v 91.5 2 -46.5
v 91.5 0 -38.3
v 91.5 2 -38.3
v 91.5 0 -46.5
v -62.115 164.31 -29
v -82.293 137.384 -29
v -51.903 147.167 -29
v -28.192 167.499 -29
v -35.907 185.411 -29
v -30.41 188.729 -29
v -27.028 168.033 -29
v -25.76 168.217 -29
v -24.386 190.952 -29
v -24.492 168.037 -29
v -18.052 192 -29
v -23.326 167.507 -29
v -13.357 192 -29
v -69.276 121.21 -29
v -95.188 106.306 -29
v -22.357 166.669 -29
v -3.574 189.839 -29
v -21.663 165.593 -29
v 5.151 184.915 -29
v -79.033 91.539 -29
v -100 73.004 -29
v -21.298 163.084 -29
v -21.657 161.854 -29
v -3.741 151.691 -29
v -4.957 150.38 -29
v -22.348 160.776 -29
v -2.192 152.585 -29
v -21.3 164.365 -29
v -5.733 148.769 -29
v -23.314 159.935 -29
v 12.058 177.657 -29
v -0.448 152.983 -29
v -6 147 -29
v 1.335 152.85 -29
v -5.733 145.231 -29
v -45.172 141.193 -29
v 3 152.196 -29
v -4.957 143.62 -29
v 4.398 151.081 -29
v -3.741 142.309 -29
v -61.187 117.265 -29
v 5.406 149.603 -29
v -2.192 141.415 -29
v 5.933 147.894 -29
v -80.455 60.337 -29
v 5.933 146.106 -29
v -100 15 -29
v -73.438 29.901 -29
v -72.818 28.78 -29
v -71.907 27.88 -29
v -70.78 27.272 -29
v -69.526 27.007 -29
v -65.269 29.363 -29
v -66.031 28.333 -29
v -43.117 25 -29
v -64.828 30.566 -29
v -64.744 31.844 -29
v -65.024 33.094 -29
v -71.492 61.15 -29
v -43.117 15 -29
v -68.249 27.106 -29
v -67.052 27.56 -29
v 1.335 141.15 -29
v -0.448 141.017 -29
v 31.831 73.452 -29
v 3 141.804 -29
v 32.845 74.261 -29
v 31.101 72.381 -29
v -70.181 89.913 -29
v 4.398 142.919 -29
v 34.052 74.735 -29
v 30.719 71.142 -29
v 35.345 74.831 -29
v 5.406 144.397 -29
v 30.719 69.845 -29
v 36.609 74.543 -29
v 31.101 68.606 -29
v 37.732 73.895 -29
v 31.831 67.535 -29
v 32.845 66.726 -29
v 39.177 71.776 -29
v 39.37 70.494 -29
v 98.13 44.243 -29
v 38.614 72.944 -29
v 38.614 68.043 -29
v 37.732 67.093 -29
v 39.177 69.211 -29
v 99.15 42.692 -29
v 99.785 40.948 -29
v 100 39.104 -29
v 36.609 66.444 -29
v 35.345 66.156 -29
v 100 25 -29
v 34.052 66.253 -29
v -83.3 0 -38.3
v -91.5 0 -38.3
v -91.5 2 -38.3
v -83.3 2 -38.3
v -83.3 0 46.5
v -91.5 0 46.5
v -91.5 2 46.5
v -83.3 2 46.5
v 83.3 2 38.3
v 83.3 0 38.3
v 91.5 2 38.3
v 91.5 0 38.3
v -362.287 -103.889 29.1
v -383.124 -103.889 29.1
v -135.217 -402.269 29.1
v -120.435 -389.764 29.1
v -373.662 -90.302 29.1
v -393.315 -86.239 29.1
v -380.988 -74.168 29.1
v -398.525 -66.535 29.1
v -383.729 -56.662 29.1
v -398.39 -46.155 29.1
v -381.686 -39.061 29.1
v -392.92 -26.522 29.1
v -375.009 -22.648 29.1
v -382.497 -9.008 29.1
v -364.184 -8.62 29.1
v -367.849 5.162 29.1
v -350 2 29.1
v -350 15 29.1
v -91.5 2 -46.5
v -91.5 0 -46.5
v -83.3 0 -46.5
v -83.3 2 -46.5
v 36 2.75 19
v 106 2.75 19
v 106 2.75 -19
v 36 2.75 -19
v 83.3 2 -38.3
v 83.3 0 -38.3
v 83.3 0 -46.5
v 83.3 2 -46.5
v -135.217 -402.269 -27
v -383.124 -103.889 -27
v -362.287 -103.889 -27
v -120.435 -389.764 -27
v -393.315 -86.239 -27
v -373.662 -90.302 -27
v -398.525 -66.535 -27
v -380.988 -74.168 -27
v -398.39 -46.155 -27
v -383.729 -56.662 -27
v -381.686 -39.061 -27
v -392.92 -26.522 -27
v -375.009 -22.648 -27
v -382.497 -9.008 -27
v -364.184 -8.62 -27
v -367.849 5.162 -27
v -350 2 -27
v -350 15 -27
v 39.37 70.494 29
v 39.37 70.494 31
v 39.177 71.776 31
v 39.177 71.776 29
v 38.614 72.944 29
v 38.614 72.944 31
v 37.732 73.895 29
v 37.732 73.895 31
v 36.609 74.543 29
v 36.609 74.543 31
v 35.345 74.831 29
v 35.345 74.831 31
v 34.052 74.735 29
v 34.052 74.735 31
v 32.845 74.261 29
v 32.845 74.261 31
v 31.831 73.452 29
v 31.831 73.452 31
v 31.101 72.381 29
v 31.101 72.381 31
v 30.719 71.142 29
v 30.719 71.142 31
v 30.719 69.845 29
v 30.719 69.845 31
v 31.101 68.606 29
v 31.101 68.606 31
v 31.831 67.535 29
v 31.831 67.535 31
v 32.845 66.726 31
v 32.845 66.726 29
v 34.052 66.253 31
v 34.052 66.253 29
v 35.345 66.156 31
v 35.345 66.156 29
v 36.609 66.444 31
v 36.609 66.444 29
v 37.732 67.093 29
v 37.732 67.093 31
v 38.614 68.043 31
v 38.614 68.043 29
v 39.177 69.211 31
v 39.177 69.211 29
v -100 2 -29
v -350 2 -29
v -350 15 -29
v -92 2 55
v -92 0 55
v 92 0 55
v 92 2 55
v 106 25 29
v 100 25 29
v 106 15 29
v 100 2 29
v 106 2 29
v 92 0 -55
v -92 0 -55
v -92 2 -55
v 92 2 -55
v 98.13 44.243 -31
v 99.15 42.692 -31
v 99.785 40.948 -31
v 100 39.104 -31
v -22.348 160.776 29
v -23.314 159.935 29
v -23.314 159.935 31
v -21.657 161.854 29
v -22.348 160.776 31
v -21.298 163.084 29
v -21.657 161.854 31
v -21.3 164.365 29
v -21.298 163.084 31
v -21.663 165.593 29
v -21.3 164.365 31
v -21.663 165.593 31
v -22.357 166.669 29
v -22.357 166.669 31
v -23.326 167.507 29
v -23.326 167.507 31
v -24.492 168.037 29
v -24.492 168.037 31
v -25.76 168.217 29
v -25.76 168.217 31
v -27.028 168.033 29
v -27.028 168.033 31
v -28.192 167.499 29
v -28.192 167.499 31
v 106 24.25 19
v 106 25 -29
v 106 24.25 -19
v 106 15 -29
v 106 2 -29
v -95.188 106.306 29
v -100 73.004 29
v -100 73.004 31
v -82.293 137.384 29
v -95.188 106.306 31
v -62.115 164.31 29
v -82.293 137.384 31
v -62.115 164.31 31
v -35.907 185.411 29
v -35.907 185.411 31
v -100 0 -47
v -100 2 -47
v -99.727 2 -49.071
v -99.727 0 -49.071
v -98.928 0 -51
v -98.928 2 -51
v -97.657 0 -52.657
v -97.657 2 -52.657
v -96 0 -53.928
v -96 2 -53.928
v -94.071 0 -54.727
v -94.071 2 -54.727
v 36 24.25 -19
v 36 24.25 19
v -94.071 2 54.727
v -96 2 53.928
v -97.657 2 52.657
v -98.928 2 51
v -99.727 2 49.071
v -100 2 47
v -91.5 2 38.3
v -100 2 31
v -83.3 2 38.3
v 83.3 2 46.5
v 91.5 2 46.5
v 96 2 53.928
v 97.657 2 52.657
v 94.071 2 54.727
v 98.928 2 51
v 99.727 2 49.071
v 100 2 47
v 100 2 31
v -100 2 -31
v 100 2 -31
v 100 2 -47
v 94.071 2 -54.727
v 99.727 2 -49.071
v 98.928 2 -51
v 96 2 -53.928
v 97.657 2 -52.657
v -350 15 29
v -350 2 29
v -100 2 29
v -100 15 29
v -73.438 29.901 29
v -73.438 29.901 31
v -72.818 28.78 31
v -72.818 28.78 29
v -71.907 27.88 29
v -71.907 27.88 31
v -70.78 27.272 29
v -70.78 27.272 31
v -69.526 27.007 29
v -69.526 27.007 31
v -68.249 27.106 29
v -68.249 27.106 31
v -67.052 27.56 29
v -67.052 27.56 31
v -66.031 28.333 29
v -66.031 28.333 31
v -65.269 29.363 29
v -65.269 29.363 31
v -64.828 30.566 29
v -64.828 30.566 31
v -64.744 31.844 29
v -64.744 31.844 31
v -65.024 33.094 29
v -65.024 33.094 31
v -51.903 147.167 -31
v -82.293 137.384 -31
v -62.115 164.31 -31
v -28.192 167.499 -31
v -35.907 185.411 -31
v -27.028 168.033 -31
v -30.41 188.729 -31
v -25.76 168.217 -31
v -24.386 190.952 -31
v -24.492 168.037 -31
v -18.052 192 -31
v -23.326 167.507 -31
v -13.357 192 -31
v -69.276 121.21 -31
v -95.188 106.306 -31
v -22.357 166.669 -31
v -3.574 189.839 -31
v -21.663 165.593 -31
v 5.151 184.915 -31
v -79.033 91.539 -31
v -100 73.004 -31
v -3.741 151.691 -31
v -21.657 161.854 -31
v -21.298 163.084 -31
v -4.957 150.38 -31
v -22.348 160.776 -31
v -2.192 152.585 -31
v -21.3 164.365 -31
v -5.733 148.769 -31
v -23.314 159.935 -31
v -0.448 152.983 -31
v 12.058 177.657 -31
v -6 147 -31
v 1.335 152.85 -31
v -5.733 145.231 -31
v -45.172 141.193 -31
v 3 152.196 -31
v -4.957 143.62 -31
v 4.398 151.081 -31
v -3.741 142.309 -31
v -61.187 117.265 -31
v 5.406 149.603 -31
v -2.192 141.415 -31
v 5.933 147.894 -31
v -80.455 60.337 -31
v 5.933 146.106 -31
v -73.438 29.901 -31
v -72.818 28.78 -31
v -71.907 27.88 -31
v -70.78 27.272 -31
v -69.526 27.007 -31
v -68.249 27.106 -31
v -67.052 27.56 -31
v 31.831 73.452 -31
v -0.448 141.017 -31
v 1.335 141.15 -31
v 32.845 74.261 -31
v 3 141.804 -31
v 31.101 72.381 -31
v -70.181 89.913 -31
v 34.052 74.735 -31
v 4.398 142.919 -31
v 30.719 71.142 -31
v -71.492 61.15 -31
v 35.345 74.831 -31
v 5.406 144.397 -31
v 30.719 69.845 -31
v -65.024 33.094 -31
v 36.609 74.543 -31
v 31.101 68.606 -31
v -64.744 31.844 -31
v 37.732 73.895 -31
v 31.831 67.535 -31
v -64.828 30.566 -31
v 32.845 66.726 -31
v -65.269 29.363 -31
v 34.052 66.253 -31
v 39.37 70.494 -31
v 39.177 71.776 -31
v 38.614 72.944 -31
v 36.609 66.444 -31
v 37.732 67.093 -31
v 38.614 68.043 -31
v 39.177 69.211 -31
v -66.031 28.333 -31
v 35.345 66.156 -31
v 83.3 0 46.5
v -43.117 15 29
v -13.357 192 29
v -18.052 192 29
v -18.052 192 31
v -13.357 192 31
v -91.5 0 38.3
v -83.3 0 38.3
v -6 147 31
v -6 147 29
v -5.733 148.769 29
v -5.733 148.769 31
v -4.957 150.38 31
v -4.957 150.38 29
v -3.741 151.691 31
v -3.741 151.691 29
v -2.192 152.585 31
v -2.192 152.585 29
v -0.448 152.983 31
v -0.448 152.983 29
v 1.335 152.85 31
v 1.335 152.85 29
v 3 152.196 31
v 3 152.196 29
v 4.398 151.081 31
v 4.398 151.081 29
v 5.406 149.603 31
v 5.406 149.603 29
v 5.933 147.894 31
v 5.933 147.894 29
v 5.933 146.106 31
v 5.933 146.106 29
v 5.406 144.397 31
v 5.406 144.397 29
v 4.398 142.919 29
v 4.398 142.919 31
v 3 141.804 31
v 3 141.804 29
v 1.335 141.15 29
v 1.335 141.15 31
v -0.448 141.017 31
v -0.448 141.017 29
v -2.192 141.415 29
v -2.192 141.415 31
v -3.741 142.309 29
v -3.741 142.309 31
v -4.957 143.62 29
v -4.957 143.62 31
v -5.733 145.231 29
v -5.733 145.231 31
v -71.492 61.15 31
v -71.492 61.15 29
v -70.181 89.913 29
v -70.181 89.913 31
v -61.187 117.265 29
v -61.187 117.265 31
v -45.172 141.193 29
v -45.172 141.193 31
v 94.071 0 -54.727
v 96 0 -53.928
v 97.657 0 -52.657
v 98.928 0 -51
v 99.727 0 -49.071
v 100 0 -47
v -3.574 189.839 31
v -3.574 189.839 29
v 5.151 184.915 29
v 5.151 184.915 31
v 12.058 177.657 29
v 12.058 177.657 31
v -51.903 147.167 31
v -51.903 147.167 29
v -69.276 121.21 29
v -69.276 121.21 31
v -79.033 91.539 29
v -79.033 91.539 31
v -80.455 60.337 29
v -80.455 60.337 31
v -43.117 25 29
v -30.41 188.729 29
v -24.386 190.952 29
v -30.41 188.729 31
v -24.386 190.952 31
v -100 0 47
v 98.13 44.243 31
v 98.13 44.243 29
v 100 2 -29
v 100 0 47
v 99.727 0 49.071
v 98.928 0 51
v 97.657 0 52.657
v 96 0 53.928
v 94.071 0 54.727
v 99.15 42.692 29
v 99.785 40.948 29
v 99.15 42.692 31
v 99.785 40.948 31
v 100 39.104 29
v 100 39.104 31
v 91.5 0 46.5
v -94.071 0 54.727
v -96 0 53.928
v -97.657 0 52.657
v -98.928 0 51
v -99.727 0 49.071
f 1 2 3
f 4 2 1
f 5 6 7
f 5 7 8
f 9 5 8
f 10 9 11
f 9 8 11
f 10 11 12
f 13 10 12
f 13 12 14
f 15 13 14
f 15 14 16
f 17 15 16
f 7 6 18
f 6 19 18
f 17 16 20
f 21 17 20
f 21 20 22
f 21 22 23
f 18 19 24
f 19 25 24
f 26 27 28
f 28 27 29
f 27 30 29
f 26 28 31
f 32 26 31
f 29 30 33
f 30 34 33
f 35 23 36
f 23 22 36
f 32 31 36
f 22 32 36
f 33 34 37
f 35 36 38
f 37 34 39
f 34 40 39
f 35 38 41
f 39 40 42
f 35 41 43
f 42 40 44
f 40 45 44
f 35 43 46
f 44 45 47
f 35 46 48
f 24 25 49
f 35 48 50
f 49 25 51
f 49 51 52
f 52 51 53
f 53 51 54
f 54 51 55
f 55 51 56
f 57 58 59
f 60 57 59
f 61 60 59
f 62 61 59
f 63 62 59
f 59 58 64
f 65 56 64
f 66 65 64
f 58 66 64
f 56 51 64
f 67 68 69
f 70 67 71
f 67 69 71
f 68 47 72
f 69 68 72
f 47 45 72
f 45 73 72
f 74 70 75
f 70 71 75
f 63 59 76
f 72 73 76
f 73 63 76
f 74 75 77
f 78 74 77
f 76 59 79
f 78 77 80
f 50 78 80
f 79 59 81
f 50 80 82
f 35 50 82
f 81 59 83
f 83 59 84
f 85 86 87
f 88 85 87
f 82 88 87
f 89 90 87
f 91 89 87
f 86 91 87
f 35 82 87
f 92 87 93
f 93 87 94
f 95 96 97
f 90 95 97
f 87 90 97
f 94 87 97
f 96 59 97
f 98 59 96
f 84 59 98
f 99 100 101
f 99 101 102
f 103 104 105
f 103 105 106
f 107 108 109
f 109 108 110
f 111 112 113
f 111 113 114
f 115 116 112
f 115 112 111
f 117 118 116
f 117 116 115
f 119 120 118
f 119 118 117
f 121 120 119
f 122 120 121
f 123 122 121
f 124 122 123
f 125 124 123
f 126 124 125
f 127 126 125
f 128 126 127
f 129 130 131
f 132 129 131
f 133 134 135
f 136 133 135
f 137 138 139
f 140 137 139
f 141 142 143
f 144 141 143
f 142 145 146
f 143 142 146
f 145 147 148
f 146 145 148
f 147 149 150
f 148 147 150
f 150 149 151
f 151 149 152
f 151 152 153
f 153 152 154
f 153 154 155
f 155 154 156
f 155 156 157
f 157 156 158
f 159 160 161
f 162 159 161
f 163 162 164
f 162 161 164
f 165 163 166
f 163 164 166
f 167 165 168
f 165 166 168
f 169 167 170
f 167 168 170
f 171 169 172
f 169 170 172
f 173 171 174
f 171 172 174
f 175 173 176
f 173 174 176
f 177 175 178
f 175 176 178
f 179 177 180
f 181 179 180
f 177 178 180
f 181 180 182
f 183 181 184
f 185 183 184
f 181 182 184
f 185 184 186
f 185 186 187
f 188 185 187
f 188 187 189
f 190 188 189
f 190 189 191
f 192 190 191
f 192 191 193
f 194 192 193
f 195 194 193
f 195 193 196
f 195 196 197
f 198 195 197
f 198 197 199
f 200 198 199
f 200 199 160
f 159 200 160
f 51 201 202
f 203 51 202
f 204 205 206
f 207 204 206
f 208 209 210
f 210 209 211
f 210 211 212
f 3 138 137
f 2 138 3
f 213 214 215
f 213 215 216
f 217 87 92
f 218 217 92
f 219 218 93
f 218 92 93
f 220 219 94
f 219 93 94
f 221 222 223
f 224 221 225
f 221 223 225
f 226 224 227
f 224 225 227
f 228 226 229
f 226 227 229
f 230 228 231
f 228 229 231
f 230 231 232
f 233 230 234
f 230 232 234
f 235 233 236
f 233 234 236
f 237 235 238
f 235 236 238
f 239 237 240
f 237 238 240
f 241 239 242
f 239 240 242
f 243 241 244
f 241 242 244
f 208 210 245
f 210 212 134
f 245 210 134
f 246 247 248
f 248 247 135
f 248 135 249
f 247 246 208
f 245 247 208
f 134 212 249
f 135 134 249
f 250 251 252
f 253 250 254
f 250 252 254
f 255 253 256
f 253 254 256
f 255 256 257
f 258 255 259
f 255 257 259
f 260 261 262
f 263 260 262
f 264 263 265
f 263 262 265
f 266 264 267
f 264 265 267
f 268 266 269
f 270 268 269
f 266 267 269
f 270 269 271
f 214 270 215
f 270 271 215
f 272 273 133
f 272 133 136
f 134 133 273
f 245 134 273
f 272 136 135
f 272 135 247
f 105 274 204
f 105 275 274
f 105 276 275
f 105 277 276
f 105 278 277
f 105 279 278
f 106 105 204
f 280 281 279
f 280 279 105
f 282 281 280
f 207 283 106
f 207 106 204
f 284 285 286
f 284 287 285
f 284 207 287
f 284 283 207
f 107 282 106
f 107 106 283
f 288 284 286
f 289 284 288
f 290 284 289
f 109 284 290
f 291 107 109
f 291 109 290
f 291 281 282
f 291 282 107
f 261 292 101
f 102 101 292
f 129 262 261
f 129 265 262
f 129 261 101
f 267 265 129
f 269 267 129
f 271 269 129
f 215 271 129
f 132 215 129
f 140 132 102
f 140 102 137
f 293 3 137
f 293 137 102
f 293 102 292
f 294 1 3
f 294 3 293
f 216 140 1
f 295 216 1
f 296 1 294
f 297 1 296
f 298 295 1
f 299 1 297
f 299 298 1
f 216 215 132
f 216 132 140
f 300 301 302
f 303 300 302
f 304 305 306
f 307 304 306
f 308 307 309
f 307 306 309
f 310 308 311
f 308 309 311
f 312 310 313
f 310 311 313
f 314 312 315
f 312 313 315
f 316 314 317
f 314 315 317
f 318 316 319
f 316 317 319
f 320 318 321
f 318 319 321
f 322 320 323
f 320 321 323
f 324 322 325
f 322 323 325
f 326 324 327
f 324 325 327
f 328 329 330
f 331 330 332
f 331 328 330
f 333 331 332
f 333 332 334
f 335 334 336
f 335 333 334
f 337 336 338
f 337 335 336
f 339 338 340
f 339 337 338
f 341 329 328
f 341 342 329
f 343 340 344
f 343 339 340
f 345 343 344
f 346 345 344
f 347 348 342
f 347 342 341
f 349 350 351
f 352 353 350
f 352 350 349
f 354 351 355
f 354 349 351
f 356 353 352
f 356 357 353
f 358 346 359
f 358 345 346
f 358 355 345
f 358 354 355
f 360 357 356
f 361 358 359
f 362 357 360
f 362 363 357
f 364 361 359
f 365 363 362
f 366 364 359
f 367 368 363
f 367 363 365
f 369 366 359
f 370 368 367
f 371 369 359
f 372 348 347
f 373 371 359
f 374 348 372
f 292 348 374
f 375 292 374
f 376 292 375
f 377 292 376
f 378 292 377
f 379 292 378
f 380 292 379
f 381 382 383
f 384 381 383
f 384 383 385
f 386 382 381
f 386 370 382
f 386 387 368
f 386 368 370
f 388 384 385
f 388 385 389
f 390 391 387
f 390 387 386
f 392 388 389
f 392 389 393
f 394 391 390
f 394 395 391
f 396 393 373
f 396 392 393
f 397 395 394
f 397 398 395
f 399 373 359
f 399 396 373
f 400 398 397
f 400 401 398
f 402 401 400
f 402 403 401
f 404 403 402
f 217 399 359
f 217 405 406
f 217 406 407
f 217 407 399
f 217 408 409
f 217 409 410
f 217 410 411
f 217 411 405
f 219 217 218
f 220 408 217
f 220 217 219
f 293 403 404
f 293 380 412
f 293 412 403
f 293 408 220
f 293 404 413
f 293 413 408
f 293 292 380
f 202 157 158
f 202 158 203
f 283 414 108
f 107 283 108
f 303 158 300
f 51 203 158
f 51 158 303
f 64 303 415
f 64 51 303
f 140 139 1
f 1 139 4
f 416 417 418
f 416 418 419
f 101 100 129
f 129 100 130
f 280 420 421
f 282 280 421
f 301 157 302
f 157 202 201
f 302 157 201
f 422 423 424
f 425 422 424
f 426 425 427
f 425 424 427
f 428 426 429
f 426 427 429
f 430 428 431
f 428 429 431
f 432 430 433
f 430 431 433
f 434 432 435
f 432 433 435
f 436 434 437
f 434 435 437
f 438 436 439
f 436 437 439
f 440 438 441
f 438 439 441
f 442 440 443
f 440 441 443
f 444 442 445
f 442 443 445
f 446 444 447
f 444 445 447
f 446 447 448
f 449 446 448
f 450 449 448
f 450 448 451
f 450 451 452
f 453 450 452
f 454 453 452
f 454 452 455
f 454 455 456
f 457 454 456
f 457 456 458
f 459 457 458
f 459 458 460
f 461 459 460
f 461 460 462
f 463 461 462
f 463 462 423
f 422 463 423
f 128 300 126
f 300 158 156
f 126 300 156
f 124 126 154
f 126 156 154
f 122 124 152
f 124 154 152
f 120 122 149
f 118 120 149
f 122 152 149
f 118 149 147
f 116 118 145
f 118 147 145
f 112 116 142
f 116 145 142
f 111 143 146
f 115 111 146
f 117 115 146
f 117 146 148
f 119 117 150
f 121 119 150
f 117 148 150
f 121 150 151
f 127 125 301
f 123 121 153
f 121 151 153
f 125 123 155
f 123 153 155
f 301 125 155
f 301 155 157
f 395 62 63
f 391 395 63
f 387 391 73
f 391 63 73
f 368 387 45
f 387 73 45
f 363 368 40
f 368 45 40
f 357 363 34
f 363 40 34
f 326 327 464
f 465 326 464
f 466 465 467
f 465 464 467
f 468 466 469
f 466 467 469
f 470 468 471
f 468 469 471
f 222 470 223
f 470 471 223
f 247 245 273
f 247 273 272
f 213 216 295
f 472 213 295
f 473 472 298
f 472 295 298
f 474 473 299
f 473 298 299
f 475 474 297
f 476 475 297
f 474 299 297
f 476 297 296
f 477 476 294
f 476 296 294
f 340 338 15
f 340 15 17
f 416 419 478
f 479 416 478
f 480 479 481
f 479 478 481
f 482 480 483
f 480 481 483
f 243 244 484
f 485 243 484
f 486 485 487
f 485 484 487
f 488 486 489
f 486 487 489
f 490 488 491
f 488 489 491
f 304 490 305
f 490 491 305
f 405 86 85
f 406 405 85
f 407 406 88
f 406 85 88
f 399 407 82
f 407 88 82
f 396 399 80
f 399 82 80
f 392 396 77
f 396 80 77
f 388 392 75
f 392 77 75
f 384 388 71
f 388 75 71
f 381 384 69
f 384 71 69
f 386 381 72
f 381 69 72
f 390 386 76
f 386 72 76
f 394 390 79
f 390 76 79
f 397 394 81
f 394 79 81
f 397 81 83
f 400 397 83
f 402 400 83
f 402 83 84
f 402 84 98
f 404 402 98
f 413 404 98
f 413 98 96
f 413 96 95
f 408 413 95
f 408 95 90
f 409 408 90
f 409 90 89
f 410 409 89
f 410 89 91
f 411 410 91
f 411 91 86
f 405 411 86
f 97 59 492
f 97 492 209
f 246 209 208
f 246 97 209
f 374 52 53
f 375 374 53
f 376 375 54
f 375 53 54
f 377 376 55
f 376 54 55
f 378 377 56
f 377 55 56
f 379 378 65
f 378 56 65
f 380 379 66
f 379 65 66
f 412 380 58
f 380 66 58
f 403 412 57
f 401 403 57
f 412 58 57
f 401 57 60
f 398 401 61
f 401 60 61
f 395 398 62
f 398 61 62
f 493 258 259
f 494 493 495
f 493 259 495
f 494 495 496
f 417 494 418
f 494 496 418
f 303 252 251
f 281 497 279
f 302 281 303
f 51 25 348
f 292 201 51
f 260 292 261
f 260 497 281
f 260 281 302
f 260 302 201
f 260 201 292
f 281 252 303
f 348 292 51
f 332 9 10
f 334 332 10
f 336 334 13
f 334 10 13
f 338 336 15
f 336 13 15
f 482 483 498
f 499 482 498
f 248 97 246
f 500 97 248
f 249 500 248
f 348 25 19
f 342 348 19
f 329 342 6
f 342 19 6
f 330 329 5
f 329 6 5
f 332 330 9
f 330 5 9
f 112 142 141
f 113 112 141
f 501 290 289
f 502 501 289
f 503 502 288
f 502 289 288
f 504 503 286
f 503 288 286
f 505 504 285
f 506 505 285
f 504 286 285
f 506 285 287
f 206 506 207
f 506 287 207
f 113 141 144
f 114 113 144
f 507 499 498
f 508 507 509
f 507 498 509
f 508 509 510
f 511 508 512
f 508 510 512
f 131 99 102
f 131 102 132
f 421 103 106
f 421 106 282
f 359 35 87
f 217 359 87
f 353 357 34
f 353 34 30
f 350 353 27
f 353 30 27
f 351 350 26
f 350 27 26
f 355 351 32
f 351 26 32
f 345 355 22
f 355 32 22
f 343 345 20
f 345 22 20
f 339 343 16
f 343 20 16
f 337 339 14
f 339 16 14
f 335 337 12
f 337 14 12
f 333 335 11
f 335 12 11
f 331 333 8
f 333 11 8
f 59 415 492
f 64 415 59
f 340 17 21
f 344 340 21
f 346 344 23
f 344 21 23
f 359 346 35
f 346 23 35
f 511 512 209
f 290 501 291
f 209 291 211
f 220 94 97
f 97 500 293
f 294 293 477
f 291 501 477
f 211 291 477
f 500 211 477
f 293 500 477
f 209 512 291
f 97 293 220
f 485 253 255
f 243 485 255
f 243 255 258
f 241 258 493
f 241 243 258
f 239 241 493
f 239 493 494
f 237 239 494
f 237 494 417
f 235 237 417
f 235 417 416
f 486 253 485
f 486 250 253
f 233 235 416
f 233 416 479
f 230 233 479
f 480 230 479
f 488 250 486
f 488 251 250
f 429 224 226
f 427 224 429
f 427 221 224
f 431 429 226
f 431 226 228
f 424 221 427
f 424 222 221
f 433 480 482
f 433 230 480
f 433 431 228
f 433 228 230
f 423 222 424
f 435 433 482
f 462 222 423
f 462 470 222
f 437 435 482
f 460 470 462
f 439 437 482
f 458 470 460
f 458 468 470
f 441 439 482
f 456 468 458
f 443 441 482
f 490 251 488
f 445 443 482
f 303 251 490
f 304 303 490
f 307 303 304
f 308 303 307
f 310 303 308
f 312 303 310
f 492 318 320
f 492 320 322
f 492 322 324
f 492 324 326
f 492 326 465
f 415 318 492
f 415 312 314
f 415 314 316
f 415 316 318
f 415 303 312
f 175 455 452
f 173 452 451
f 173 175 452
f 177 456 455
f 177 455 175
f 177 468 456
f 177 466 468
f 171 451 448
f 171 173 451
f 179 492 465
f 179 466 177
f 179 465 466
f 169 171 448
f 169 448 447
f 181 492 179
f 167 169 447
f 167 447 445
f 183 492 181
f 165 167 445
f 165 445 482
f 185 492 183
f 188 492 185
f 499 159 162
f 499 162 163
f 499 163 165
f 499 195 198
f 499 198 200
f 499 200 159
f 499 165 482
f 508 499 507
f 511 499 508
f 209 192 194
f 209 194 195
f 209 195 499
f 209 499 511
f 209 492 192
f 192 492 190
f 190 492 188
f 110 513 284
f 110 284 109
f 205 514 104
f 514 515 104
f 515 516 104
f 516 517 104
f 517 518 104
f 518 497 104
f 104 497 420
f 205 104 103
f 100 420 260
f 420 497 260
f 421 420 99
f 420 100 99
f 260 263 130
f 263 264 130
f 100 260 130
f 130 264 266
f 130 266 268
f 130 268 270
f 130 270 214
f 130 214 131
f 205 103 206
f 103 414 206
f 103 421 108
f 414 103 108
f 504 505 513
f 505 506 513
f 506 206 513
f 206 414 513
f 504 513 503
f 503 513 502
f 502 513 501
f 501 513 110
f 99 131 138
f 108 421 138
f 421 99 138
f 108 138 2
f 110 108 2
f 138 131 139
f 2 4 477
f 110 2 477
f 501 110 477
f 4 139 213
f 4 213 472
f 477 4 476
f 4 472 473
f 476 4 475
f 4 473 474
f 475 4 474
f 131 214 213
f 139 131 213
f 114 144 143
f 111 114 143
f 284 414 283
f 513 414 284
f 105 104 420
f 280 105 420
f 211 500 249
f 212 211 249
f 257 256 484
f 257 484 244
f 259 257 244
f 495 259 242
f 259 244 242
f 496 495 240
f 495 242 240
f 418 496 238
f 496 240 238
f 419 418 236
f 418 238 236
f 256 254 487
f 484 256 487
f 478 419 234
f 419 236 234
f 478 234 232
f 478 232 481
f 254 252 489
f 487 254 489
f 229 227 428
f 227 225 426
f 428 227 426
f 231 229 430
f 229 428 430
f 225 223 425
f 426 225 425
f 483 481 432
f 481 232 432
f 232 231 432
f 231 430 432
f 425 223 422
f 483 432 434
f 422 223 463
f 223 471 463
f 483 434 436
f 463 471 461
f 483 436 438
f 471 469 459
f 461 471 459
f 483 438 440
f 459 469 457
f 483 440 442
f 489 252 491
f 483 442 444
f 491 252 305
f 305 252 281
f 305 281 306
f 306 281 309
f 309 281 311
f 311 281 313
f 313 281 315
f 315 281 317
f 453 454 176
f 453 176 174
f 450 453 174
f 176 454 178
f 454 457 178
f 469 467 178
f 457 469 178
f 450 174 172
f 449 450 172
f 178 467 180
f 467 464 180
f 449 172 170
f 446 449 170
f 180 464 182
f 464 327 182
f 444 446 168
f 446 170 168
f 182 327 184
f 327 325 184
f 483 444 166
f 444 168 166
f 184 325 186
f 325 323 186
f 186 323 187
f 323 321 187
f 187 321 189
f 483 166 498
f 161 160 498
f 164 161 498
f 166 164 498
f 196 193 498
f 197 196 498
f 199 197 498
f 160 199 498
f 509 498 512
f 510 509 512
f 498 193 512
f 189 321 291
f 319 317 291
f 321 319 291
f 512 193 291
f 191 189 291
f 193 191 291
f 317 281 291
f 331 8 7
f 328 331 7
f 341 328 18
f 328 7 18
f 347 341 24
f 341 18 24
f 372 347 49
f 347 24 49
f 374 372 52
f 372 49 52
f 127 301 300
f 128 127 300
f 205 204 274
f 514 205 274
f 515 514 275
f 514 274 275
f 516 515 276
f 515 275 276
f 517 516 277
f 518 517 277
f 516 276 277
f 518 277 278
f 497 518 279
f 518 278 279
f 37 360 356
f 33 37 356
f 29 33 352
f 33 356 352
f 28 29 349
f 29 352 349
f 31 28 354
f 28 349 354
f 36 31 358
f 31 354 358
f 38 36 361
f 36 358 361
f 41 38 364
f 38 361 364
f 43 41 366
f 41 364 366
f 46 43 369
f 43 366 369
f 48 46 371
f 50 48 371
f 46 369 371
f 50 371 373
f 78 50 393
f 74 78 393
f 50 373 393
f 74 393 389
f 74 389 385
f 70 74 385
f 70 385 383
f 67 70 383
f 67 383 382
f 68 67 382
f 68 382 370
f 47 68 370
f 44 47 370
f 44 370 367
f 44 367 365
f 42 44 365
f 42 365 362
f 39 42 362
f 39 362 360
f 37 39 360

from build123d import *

# Parameters (mm, degrees)
CROQUIS1_W                   = 200
CROQUIS1_H                   = 110
CROQUIS1_W_2                 = 183
CROQUIS1_H_2                 = 93
CROQUIS1_W_3                 = 166.6
CROQUIS1_H_3                 = 8.2
CROQUIS1_H_4                 = 76.6
CROQUIS1_W_4                 = 8.2
SALIENTE_EXTRUIR1_DEPTH      = 2
CORTAR_EXTRUIR1_DEPTH        = 2
CROQUIS3_W                   = 200
CROQUIS3_H                   = 2
SALIENTE_EXTRUIR2_DEPTH      = 190
CROQUIS4_R                   = 4.35
CORTAR_EXTRUIR2_DEPTH        = 81
CROQUIS5_W                   = 250
CROQUIS5_H                   = 58
CROQUIS5_W_2                 = 200
CROQUIS5_W_3                 = 6
SALIENTE_EXTRUIR3_DEPTH      = 13
SALIENTE_EXTRUIR4_DEPTH      = 0.1
SALIENTE_EXTRUIR4_DEPTH_BACK = 56
CROQUIS7_R                   = 6
CORTAR_EXTRUIR3_DEPTH        = 80.1
CROQUIS10_W                  = 149.116642103
CROQUIS10_H                  = 58
SALIENTE_EXTRUIR5_DEPTH      = 10
CROQUIS11_W                  = 38
CROQUIS11_H                  = 21.5
CORTAR_EXTRUIR4_DEPTH        = 70


with BuildPart() as part:
    # Croquis1 → Saliente-Extruir1 (new body)
    # profile 1 of 6: a face of its own
    with BuildSketch(Plane(origin=(0, 0, 0), x_dir=(1, 0, 0), z_dir=(0, 1, 0))):
        Rectangle(CROQUIS1_W, CROQUIS1_H)
        Rectangle(CROQUIS1_W_2, CROQUIS1_H_2, mode=Mode.SUBTRACT)
    # profile 2 of 6: a face of its own
    with BuildSketch(Plane(origin=(0, 0, 0), x_dir=(1, 0, 0), z_dir=(0, 1, 0))):
        with Locations((0, 42.4)):
            Rectangle(CROQUIS1_W_3, CROQUIS1_H_3)
    # profile 3 of 6: a face of its own
    with BuildSketch(Plane(origin=(0, 0, 0), x_dir=(1, 0, 0), z_dir=(0, 1, 0))):
        Rectangle(CROQUIS1_W_3, CROQUIS1_H_4)
    # profile 4 of 6: a face of its own
    with BuildSketch(Plane(origin=(0, 0, 0), x_dir=(1, 0, 0), z_dir=(0, 1, 0))):
        with Locations((-87.4, 0)):
            Rectangle(CROQUIS1_W_4, CROQUIS1_H_4)
    # profile 5 of 6: a face of its own
    with BuildSketch(Plane(origin=(0, 0, 0), x_dir=(1, 0, 0), z_dir=(0, 1, 0))):
        with Locations((0, -42.4)):
            Rectangle(CROQUIS1_W_3, CROQUIS1_H_3)
    # profile 6 of 6: a face of its own
    with BuildSketch(Plane(origin=(0, 0, 0), x_dir=(1, 0, 0), z_dir=(0, 1, 0))):
        with Locations((87.4, 0)):
            Rectangle(CROQUIS1_W_4, CROQUIS1_H_4)
    extrude(amount=SALIENTE_EXTRUIR1_DEPTH)

    # Croquis2 → Cortar-Extruir1 (cut)
    with BuildSketch(Plane(origin=(0, 2, 0), x_dir=(1, 0, 0), z_dir=(0, 1, 0))):
        with BuildLine():
            ThreePointArc((-100, 47), (-97.656854249, 52.656854249), (-92, 55))
            Line((-92, 55), (-100, 55))
            Line((-100, 55), (-100, 47))
        make_face()
        with BuildLine():
            ThreePointArc((-92, -55), (-97.656854249, -52.656854249), (-100, -47))
            Line((-100, -47), (-100, -55))
            Line((-100, -55), (-92, -55))
        make_face()
        with BuildLine():
            Line((100, -55), (100, -47))
            ThreePointArc((100, -47), (97.656854249, -52.656854249), (92, -55))
            Line((92, -55), (100, -55))
        make_face()
        with BuildLine():
            Line((100, 55), (92, 55))
            ThreePointArc((92, 55), (97.656854249, 52.656854249), (100, 47))
            Line((100, 47), (100, 55))
        make_face()
    extrude(amount=-CORTAR_EXTRUIR1_DEPTH, mode=Mode.SUBTRACT)

    # Croquis3 → Saliente-Extruir2 (add)
    with BuildSketch(Plane(origin=(0, 2, 0), x_dir=(1, 0, 0), z_dir=(0, 1, 0))):
        with Locations((0, -30)):
            Rectangle(CROQUIS3_W, CROQUIS3_H)
        with Locations((0, 30)):
            Rectangle(CROQUIS3_W, CROQUIS3_H)
    extrude(amount=SALIENTE_EXTRUIR2_DEPTH)

    # Croquis4 → Cortar-Extruir2 (cut)
    with BuildSketch(Plane.XY.offset(31)):
        with BuildLine():
            ThreePointArc((-35.907198592, 185.411223689), (-27.45094246, 189.983179116), (-18.051821346, 192))
            Line((-18.051821346, 192), (-100, 192))
            Line((-100, 192), (-100, 73.004085605))
            ThreePointArc((-100, 73.004085605), (-82.293244846, 137.383897456), (-35.907198592, 185.411223689))
        make_face()
        with BuildLine():
            Line((12.058102776, 177.657452596), (98.130373638, 44.243495367))
            ThreePointArc((98.130373638, 44.243495367), (99.51807785, 41.83828614), (100, 39.103600519))
            Line((100, 39.103600519), (100, 192))
            Line((100, 192), (-13.35732151, 192))
            ThreePointArc((-13.35732151, 192), (0.971130931, 187.700726729), (12.058102776, 177.657452596))
        make_face()
        with Locations((35.02020603, 70.493592822)):
            Circle(CROQUIS4_R)
        with BuildLine():
            ThreePointArc((-28.192006816, 167.49912775), (-75.165619507, 106.707118451), (-73.438142939, 29.900839356))
            ThreePointArc((-73.438142939, 29.900839356), (-67.634394225, 27.289996416), (-65.023551285, 33.093745131))
            ThreePointArc((-65.023551285, 33.093745131), (-66.615983893, 103.895760975), (-23.31449202, 159.935408465))
            ThreePointArc((-23.31449202, 159.935408465), (-21.971389776, 166.156025506), (-28.192006816, 167.49912775))
        make_face()
    extrude(amount=-CORTAR_EXTRUIR2_DEPTH, mode=Mode.SUBTRACT)

    # Croquis5 → Saliente-Extruir3 (add)
    with BuildSketch(Plane(origin=(0, 2, 0), x_dir=(1, 0, 0), z_dir=(0, 1, 0))):
        with Locations((-225, 0)):
            Rectangle(CROQUIS5_W, CROQUIS5_H)
        Rectangle(CROQUIS5_W_2, CROQUIS5_H)
        with Locations((103, 0)):
            Rectangle(CROQUIS5_W_3, CROQUIS5_H)
    extrude(amount=SALIENTE_EXTRUIR3_DEPTH)

    # Croquis6 → Saliente-Extruir4 (add, two sides: drawn at the far end of the back side and taken through both)
    with BuildSketch(Plane.XY.offset(29).offset(-SALIENTE_EXTRUIR4_DEPTH_BACK)):
        with BuildLine():
            Line((-383.123851027, -103.888519267), (-135.216927507, -402.269059015))
            Line((-135.216927507, -402.269059015), (-120.435481517, -389.763884447))
            Line((-120.435481517, -389.763884447), (-362.287418648, -103.888519267))
            ThreePointArc((-362.287418648, -103.888519267), (-383.304553722, -47.792485784), (-350, 2))
            Line((-350, 2), (-350, 15))
            ThreePointArc((-350, 15), (-396.30683482, -36.156950221), (-383.123851027, -103.888519267))
        make_face()
    extrude(amount=SALIENTE_EXTRUIR4_DEPTH + SALIENTE_EXTRUIR4_DEPTH_BACK)

    # Croquis7 → Cortar-Extruir3 (cut)
    with BuildSketch(Plane(origin=(0, 0, -31), x_dir=(-1, 0, 0), z_dir=(0, 0, -1))):
        with Locations((0, 147)):
            Circle(CROQUIS7_R)
    extrude(amount=-CORTAR_EXTRUIR3_DEPTH, mode=Mode.SUBTRACT)

    # Croquis10 → Saliente-Extruir5 (add)
    with BuildSketch(Plane(origin=(0, 15, 0), x_dir=(1, 0, 0), z_dir=(0, 1, 0))):
        with Locations((31.441678948, 0)):
            Rectangle(CROQUIS10_W, CROQUIS10_H)
    extrude(amount=SALIENTE_EXTRUIR5_DEPTH)

    # Croquis11 → Cortar-Extruir4 (cut)
    with BuildSketch(Plane(origin=(106, 0, 0), x_dir=(0, 0, -1), z_dir=(1, 0, 0))):
        with Locations((0, 13.5)):
            Rectangle(CROQUIS11_W, CROQUIS11_H)
    extrude(amount=-CORTAR_EXTRUIR4_DEPTH, mode=Mode.SUBTRACT)


solid = part.part
